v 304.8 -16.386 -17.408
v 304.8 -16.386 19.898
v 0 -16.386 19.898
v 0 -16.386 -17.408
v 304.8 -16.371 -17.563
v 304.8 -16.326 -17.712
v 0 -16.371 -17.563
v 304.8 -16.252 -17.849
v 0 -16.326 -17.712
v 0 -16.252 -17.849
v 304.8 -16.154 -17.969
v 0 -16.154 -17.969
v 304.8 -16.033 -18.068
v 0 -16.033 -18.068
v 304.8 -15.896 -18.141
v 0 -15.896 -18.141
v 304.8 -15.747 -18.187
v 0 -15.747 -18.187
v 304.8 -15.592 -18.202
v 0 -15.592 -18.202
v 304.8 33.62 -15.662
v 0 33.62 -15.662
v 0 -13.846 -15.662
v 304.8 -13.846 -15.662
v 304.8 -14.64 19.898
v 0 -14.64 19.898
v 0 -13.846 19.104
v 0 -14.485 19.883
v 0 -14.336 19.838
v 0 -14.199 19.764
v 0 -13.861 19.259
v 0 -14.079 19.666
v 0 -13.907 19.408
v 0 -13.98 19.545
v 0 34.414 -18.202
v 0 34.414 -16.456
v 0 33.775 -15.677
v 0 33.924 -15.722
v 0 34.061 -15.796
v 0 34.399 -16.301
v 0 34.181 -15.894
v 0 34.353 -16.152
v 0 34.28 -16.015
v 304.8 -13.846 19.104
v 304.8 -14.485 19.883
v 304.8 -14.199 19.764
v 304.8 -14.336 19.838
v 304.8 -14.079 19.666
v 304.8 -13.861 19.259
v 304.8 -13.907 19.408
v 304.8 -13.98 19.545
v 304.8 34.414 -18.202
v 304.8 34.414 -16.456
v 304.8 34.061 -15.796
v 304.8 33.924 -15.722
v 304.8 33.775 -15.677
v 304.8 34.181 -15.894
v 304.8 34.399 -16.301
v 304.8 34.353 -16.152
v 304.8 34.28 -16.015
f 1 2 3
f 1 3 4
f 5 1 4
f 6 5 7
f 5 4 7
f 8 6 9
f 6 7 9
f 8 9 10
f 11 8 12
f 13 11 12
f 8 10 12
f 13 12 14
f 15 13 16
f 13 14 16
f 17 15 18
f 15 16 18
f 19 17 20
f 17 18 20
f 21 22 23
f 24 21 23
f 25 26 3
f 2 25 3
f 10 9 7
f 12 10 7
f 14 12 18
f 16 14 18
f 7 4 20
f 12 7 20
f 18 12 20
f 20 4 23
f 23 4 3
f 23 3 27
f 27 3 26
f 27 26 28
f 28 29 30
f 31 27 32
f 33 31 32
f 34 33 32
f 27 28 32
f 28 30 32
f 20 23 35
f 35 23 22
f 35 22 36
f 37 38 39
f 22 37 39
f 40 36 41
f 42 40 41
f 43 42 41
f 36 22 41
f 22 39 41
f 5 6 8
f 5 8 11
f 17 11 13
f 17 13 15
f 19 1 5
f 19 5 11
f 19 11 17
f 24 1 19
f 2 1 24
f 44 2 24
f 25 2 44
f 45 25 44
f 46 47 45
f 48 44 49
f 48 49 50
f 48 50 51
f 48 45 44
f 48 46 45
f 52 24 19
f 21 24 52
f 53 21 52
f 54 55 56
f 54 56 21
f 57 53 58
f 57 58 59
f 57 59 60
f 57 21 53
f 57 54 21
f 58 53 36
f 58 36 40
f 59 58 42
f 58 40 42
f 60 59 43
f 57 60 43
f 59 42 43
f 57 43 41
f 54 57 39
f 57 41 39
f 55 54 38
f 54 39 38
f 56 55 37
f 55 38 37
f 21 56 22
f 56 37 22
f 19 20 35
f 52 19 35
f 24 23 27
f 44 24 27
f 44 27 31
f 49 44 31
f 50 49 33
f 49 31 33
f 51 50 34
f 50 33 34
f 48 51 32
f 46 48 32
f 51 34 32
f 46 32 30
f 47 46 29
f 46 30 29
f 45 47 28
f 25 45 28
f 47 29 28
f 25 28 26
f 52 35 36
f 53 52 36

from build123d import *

# Parameters (mm, degrees)
F1_DEPTH = 304.8


with BuildPart() as f1:
    # F0 (on Right) → F1 (new body)
    with BuildSketch(Plane.YZ):
        with BuildLine():
            Line((-14.639986, 19.898164), (-16.386236, 19.898164))
            Line((-16.386236, 19.898164), (-16.386236, -17.408086))
            ThreePointArc((-16.386236, -17.408086), (-16.153752, -17.969352), (-15.592486, -18.201836))
            Line((-15.592486, -18.201836), (34.413764, -18.201836))
            Line((34.413764, -18.201836), (34.413764, -16.455586))
            ThreePointArc((34.413764, -16.455586), (34.18128, -15.89432), (33.620014, -15.661836))
            Line((33.620014, -15.661836), (-13.846236, -15.661836))
            Line((-13.846236, -15.661836), (-13.846236, 19.104414))
            ThreePointArc((-13.846236, 19.104414), (-14.07872, 19.66568), (-14.639986, 19.898164))
        make_face()
    extrude(amount=F1_DEPTH)


solid = f1.part
